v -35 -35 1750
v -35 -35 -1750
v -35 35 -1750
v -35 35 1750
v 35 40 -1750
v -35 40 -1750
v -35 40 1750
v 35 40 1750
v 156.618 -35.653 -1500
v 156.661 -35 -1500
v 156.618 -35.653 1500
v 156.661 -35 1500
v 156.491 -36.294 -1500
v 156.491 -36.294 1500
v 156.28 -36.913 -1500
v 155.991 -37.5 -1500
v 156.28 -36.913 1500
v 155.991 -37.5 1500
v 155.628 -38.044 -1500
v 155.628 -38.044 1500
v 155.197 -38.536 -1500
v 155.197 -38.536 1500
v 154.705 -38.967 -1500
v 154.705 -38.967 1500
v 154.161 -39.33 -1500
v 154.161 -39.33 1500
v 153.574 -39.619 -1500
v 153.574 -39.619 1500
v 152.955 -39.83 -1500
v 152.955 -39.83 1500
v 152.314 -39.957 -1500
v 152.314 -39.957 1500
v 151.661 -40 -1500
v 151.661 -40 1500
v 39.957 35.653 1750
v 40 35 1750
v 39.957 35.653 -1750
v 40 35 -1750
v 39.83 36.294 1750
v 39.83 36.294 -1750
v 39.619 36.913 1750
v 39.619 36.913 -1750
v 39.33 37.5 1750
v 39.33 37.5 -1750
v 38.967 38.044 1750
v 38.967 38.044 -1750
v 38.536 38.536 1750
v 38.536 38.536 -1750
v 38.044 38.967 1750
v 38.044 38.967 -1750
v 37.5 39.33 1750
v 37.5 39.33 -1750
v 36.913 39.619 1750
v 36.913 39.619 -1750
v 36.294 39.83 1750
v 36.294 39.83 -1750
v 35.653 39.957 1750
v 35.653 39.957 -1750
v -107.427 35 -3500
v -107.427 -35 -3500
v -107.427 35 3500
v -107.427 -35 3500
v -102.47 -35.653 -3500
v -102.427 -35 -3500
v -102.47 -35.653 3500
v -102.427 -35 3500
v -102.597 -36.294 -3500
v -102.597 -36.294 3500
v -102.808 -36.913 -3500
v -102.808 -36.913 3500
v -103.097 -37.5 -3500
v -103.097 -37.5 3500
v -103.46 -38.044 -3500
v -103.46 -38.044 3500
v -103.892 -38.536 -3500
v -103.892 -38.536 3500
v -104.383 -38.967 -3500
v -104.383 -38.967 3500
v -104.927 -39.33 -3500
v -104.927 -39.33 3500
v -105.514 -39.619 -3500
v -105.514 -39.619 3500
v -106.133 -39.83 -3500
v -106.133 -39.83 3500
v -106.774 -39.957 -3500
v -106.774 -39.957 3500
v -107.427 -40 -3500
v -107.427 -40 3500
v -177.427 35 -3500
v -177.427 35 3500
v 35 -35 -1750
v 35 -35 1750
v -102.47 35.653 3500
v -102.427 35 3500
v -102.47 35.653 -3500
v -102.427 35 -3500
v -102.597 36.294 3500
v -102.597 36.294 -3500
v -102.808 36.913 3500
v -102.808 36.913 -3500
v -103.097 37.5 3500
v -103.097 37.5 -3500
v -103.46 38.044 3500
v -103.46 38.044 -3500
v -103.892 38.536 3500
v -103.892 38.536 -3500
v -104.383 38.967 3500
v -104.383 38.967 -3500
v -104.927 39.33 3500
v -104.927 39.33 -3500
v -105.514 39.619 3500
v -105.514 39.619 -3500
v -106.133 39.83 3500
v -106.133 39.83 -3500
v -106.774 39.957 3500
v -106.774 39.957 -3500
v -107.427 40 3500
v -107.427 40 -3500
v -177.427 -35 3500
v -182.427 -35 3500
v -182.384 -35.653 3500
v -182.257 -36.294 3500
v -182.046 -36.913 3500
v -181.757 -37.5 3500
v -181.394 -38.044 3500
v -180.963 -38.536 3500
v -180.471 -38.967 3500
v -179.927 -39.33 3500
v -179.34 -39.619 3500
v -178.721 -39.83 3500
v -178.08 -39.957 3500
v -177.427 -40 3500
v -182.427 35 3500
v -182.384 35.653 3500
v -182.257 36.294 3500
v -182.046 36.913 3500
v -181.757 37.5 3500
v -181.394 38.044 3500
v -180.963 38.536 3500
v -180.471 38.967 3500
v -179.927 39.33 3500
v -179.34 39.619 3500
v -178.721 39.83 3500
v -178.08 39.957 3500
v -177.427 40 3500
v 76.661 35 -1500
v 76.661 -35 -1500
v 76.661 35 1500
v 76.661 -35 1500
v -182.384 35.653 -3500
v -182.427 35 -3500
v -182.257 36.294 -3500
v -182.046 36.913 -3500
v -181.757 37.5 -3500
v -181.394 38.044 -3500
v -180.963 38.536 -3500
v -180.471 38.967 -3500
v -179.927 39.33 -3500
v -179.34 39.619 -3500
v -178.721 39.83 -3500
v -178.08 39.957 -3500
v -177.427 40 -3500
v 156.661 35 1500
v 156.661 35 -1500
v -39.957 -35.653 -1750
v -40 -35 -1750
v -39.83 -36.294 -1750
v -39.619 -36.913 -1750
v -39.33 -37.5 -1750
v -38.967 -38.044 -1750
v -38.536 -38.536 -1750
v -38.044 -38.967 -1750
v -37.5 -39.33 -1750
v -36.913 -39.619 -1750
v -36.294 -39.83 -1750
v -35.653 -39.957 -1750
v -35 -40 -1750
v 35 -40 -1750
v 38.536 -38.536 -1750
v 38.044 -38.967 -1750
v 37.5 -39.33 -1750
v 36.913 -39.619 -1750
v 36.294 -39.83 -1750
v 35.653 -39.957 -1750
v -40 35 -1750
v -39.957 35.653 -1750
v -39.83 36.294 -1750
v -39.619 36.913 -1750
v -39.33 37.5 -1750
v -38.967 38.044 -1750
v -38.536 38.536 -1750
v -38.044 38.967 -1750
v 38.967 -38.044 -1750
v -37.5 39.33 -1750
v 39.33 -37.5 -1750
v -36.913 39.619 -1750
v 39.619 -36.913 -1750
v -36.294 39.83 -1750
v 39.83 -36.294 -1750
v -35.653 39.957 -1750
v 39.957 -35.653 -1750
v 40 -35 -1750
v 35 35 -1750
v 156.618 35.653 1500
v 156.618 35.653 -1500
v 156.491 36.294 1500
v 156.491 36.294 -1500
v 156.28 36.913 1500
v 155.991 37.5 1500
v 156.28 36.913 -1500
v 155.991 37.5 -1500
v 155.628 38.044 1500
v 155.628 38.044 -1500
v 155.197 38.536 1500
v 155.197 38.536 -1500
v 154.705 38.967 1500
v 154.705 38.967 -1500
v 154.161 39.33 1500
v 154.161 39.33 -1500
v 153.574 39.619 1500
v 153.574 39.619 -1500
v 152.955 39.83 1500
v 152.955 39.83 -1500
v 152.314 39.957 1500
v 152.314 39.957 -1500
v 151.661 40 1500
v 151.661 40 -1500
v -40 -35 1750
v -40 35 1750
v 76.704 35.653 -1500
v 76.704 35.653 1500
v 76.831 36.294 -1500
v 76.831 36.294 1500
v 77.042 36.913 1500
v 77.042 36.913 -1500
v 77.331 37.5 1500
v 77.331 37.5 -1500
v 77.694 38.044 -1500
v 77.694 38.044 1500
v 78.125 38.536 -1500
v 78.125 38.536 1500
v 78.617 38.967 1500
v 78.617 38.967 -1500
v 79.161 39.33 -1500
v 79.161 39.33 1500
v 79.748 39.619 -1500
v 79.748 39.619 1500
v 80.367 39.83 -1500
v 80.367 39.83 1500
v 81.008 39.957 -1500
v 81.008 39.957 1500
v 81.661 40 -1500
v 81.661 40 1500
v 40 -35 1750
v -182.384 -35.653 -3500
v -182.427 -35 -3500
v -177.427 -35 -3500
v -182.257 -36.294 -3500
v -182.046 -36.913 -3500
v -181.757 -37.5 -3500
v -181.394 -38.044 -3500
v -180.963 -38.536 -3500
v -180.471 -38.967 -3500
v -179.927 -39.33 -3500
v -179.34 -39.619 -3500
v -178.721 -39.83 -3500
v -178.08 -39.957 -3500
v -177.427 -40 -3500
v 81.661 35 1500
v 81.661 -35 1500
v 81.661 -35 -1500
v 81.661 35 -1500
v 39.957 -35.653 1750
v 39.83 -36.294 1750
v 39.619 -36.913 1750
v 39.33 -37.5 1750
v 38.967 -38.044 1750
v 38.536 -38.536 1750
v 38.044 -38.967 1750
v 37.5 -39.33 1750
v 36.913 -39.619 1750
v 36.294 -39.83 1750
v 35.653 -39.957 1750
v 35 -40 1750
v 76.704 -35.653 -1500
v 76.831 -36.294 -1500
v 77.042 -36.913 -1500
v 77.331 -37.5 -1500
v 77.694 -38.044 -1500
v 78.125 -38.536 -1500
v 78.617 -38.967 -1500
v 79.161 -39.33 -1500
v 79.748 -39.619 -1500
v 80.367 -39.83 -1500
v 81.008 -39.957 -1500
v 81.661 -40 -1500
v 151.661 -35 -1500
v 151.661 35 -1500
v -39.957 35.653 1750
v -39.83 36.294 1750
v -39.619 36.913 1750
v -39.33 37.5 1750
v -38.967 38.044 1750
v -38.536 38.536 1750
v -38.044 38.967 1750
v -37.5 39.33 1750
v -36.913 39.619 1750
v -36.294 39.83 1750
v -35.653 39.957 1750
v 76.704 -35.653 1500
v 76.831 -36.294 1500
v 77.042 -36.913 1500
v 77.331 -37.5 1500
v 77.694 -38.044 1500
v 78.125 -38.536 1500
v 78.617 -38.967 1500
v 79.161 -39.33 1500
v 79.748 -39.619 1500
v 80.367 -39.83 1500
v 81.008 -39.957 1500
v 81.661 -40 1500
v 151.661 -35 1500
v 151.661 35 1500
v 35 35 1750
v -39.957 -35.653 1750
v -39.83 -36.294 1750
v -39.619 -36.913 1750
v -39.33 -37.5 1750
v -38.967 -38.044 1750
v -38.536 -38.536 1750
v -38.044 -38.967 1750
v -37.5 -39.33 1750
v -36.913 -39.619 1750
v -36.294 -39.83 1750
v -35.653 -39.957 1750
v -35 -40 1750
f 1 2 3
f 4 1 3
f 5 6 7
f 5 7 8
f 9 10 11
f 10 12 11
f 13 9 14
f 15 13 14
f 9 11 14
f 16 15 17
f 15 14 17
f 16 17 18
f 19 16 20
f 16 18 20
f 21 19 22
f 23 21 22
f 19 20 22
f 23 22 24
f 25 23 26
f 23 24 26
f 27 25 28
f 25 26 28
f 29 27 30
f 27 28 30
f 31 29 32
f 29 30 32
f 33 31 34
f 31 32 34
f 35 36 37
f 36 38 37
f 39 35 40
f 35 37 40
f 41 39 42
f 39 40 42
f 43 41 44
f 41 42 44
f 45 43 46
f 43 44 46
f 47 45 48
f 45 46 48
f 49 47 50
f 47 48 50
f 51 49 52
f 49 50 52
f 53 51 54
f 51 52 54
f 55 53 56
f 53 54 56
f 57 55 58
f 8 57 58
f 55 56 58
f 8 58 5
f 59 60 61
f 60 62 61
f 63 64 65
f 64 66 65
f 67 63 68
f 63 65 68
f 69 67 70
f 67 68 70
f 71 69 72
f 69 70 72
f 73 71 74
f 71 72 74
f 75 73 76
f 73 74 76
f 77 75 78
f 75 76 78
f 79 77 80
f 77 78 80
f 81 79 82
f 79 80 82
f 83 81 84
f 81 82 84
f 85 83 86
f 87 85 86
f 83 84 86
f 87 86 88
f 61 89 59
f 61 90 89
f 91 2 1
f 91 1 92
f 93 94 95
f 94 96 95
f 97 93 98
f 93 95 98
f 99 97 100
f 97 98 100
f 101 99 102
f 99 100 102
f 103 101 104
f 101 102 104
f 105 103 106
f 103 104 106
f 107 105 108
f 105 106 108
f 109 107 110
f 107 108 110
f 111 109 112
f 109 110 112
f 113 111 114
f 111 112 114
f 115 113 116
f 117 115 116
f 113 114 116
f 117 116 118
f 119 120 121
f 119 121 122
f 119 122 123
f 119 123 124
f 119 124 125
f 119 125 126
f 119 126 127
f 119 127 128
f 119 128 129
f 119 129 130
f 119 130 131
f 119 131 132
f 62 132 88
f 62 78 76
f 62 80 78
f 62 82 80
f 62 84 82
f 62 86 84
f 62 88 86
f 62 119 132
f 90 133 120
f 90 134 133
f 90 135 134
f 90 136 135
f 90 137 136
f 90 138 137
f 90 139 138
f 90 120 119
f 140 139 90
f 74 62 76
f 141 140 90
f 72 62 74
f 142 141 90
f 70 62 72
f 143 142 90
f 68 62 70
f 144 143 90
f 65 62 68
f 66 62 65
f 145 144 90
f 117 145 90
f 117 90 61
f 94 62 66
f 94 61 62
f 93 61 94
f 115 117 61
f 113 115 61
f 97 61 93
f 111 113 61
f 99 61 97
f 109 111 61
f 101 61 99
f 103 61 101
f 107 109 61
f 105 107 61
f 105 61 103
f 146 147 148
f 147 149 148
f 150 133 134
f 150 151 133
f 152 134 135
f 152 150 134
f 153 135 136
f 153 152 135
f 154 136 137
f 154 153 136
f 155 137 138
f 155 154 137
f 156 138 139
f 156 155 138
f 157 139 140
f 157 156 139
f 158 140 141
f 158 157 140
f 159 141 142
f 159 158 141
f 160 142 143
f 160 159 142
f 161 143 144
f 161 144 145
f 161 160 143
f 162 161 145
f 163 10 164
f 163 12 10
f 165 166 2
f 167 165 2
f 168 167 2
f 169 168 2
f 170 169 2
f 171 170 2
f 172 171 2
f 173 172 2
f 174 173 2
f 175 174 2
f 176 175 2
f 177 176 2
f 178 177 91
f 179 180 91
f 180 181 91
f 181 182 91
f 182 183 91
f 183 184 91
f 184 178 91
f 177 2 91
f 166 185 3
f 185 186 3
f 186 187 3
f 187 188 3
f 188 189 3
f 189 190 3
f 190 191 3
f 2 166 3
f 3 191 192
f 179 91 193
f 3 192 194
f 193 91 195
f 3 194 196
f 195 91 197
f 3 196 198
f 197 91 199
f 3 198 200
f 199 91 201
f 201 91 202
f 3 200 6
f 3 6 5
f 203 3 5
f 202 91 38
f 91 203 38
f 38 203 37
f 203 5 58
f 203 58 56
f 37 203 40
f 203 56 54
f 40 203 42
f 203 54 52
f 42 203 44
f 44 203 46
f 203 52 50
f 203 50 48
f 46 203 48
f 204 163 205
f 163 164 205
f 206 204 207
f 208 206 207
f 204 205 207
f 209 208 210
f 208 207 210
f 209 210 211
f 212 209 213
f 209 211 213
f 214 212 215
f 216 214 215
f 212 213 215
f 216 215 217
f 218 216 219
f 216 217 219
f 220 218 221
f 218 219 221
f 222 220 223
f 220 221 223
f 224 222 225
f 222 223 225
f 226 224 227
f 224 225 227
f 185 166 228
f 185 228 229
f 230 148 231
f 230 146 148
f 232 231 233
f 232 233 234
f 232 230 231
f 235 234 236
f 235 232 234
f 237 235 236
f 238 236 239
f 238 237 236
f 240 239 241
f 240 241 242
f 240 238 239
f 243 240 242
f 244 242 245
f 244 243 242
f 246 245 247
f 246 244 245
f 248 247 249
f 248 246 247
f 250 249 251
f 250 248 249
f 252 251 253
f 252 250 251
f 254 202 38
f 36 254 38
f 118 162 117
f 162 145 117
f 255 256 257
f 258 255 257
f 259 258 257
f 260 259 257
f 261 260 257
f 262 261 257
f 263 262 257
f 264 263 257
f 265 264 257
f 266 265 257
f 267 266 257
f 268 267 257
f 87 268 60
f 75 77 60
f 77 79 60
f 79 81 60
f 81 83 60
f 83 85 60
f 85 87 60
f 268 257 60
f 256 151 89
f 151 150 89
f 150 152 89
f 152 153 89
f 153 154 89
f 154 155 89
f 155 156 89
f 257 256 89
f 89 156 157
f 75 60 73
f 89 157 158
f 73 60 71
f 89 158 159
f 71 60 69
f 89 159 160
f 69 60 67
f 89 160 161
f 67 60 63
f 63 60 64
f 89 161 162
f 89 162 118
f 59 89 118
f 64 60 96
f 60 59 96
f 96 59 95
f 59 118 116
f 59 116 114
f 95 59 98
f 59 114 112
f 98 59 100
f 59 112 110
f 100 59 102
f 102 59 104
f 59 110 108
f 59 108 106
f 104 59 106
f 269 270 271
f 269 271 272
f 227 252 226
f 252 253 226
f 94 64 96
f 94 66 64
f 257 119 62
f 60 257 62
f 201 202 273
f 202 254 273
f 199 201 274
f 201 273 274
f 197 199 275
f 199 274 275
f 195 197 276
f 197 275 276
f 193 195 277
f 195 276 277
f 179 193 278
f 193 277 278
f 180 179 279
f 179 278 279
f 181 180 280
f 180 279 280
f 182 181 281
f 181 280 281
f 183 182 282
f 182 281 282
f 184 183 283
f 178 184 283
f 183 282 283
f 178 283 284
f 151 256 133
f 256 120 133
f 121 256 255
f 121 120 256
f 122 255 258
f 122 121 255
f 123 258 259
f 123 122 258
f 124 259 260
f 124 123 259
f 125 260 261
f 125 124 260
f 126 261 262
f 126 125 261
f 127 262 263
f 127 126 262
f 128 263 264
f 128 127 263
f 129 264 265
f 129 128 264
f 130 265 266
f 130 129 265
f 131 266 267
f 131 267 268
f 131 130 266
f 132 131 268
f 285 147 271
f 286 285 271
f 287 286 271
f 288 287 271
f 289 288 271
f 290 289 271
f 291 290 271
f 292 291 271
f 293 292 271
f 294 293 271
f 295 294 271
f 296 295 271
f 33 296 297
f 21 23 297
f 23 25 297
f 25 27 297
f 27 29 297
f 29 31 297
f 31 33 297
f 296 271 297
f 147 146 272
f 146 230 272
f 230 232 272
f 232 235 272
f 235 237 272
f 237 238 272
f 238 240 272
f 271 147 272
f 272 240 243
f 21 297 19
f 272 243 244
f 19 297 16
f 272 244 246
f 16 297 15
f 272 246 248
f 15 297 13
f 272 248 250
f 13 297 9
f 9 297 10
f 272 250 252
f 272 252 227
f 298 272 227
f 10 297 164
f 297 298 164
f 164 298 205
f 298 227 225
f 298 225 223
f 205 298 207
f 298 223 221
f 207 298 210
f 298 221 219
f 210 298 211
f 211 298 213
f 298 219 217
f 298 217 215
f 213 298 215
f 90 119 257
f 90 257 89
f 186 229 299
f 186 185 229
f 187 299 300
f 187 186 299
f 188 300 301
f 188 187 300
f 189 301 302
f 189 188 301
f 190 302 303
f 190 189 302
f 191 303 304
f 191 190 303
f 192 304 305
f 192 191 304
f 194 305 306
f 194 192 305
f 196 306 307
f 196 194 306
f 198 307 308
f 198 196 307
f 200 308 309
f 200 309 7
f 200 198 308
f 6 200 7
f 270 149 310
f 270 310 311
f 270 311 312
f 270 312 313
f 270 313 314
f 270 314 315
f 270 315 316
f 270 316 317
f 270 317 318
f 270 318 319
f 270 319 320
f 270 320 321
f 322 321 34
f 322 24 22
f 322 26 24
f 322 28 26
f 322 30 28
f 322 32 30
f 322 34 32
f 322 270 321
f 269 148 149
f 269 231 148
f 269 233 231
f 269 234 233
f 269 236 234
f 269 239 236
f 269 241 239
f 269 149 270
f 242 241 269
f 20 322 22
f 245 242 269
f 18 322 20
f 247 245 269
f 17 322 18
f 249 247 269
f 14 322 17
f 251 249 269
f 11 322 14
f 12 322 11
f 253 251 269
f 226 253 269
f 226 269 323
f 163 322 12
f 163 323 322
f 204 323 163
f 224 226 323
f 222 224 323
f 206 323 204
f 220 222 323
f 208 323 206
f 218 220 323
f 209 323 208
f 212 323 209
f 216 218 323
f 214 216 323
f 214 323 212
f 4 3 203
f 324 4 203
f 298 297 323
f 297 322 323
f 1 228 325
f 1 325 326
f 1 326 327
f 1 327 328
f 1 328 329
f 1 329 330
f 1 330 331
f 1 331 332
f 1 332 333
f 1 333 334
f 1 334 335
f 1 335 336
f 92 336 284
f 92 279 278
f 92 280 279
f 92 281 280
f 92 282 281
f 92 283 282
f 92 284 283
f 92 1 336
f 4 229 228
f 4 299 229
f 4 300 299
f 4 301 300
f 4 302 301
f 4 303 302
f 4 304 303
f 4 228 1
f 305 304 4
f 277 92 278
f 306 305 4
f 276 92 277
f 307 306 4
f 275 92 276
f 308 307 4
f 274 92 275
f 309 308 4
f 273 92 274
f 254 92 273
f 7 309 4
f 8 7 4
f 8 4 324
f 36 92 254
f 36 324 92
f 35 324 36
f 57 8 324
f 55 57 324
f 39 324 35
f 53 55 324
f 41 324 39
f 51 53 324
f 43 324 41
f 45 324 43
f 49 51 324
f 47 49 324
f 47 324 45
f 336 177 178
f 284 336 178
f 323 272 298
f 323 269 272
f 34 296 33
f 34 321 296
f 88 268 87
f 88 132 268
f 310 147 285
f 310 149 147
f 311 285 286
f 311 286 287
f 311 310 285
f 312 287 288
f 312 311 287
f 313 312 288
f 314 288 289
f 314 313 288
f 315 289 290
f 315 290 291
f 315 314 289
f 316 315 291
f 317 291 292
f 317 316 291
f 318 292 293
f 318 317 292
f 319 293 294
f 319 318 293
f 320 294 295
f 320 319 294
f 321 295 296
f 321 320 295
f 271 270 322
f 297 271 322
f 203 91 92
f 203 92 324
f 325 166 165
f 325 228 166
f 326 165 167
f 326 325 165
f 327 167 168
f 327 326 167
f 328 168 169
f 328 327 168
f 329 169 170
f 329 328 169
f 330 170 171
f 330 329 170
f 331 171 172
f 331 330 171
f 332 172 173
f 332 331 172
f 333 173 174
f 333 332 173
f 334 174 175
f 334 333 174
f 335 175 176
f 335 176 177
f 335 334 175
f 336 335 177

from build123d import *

# Parameters (mm, degrees)
F0_W     = 80
F0_H     = 80
F0_W_2   = 70
F0_H_2   = 70
F1_DEPTH = 1750
F2_W     = 80
F2_H     = 80
F2_W_2   = 70
F2_H_2   = 70
F3_DEPTH = 1500
F4_W     = 80
F4_H     = 80
F4_W_2   = 70
F4_H_2   = 70
F5_DEPTH = 3500
F6_R     = 5
F6_2_R   = 5
F6_3_R   = 5


with BuildPart() as f1:
    # F0 (on Top) → F1 (new body, symmetric)
    with BuildSketch(Plane.XY):
        Rectangle(F0_W, F0_H)
        Rectangle(F0_W_2, F0_H_2, mode=Mode.SUBTRACT)
    extrude(amount=F1_DEPTH, both=True)

    # F6
    f6_edges = [f1.edges().sort_by_distance(p)[0] for p in [
        (-40, 40, 0),
        (-40, -40, 0),
        (40, -40, 0),
        (40, 40, 0),
    ]]
    fillet(f6_edges, radius=F6_R)


with BuildPart() as f3:
    # F2 (on Top) → F3 (new body, symmetric)
    with BuildSketch(Plane.XY):
        with Locations((116.6609823704, 0)):
            Rectangle(F2_W, F2_H)
        with Locations((116.6609823704, 0)):
            Rectangle(F2_W_2, F2_H_2, mode=Mode.SUBTRACT)
    extrude(amount=F3_DEPTH, both=True)

    # F6#2
    f6_2_edges = [f3.edges().sort_by_distance(p)[0] for p in [
        (156.660982, -40, 0),
        (76.660982, -40, 0),
        (156.660982, 40, 0),
        (76.660982, 40, 0),
    ]]
    fillet(f6_2_edges, radius=F6_2_R)


with BuildPart() as f5:
    # F4 (on Top) → F5 (new body, symmetric)
    with BuildSketch(Plane.XY):
        with Locations((-142.4270495772, 0)):
            Rectangle(F4_W, F4_H)
        with Locations((-142.4270495772, 0)):
            Rectangle(F4_W_2, F4_H_2, mode=Mode.SUBTRACT)
    extrude(amount=F5_DEPTH, both=True)

    # F6#3
    f6_3_edges = [f5.edges().sort_by_distance(p)[0] for p in [
        (-102.42705, -40, 0),
        (-182.42705, -40, 0),
        (-102.42705, 40, 0),
        (-182.42705, 40, 0),
    ]]
    fillet(f6_3_edges, radius=F6_3_R)


solid = Compound([f1.part, f3.part, f5.part])
